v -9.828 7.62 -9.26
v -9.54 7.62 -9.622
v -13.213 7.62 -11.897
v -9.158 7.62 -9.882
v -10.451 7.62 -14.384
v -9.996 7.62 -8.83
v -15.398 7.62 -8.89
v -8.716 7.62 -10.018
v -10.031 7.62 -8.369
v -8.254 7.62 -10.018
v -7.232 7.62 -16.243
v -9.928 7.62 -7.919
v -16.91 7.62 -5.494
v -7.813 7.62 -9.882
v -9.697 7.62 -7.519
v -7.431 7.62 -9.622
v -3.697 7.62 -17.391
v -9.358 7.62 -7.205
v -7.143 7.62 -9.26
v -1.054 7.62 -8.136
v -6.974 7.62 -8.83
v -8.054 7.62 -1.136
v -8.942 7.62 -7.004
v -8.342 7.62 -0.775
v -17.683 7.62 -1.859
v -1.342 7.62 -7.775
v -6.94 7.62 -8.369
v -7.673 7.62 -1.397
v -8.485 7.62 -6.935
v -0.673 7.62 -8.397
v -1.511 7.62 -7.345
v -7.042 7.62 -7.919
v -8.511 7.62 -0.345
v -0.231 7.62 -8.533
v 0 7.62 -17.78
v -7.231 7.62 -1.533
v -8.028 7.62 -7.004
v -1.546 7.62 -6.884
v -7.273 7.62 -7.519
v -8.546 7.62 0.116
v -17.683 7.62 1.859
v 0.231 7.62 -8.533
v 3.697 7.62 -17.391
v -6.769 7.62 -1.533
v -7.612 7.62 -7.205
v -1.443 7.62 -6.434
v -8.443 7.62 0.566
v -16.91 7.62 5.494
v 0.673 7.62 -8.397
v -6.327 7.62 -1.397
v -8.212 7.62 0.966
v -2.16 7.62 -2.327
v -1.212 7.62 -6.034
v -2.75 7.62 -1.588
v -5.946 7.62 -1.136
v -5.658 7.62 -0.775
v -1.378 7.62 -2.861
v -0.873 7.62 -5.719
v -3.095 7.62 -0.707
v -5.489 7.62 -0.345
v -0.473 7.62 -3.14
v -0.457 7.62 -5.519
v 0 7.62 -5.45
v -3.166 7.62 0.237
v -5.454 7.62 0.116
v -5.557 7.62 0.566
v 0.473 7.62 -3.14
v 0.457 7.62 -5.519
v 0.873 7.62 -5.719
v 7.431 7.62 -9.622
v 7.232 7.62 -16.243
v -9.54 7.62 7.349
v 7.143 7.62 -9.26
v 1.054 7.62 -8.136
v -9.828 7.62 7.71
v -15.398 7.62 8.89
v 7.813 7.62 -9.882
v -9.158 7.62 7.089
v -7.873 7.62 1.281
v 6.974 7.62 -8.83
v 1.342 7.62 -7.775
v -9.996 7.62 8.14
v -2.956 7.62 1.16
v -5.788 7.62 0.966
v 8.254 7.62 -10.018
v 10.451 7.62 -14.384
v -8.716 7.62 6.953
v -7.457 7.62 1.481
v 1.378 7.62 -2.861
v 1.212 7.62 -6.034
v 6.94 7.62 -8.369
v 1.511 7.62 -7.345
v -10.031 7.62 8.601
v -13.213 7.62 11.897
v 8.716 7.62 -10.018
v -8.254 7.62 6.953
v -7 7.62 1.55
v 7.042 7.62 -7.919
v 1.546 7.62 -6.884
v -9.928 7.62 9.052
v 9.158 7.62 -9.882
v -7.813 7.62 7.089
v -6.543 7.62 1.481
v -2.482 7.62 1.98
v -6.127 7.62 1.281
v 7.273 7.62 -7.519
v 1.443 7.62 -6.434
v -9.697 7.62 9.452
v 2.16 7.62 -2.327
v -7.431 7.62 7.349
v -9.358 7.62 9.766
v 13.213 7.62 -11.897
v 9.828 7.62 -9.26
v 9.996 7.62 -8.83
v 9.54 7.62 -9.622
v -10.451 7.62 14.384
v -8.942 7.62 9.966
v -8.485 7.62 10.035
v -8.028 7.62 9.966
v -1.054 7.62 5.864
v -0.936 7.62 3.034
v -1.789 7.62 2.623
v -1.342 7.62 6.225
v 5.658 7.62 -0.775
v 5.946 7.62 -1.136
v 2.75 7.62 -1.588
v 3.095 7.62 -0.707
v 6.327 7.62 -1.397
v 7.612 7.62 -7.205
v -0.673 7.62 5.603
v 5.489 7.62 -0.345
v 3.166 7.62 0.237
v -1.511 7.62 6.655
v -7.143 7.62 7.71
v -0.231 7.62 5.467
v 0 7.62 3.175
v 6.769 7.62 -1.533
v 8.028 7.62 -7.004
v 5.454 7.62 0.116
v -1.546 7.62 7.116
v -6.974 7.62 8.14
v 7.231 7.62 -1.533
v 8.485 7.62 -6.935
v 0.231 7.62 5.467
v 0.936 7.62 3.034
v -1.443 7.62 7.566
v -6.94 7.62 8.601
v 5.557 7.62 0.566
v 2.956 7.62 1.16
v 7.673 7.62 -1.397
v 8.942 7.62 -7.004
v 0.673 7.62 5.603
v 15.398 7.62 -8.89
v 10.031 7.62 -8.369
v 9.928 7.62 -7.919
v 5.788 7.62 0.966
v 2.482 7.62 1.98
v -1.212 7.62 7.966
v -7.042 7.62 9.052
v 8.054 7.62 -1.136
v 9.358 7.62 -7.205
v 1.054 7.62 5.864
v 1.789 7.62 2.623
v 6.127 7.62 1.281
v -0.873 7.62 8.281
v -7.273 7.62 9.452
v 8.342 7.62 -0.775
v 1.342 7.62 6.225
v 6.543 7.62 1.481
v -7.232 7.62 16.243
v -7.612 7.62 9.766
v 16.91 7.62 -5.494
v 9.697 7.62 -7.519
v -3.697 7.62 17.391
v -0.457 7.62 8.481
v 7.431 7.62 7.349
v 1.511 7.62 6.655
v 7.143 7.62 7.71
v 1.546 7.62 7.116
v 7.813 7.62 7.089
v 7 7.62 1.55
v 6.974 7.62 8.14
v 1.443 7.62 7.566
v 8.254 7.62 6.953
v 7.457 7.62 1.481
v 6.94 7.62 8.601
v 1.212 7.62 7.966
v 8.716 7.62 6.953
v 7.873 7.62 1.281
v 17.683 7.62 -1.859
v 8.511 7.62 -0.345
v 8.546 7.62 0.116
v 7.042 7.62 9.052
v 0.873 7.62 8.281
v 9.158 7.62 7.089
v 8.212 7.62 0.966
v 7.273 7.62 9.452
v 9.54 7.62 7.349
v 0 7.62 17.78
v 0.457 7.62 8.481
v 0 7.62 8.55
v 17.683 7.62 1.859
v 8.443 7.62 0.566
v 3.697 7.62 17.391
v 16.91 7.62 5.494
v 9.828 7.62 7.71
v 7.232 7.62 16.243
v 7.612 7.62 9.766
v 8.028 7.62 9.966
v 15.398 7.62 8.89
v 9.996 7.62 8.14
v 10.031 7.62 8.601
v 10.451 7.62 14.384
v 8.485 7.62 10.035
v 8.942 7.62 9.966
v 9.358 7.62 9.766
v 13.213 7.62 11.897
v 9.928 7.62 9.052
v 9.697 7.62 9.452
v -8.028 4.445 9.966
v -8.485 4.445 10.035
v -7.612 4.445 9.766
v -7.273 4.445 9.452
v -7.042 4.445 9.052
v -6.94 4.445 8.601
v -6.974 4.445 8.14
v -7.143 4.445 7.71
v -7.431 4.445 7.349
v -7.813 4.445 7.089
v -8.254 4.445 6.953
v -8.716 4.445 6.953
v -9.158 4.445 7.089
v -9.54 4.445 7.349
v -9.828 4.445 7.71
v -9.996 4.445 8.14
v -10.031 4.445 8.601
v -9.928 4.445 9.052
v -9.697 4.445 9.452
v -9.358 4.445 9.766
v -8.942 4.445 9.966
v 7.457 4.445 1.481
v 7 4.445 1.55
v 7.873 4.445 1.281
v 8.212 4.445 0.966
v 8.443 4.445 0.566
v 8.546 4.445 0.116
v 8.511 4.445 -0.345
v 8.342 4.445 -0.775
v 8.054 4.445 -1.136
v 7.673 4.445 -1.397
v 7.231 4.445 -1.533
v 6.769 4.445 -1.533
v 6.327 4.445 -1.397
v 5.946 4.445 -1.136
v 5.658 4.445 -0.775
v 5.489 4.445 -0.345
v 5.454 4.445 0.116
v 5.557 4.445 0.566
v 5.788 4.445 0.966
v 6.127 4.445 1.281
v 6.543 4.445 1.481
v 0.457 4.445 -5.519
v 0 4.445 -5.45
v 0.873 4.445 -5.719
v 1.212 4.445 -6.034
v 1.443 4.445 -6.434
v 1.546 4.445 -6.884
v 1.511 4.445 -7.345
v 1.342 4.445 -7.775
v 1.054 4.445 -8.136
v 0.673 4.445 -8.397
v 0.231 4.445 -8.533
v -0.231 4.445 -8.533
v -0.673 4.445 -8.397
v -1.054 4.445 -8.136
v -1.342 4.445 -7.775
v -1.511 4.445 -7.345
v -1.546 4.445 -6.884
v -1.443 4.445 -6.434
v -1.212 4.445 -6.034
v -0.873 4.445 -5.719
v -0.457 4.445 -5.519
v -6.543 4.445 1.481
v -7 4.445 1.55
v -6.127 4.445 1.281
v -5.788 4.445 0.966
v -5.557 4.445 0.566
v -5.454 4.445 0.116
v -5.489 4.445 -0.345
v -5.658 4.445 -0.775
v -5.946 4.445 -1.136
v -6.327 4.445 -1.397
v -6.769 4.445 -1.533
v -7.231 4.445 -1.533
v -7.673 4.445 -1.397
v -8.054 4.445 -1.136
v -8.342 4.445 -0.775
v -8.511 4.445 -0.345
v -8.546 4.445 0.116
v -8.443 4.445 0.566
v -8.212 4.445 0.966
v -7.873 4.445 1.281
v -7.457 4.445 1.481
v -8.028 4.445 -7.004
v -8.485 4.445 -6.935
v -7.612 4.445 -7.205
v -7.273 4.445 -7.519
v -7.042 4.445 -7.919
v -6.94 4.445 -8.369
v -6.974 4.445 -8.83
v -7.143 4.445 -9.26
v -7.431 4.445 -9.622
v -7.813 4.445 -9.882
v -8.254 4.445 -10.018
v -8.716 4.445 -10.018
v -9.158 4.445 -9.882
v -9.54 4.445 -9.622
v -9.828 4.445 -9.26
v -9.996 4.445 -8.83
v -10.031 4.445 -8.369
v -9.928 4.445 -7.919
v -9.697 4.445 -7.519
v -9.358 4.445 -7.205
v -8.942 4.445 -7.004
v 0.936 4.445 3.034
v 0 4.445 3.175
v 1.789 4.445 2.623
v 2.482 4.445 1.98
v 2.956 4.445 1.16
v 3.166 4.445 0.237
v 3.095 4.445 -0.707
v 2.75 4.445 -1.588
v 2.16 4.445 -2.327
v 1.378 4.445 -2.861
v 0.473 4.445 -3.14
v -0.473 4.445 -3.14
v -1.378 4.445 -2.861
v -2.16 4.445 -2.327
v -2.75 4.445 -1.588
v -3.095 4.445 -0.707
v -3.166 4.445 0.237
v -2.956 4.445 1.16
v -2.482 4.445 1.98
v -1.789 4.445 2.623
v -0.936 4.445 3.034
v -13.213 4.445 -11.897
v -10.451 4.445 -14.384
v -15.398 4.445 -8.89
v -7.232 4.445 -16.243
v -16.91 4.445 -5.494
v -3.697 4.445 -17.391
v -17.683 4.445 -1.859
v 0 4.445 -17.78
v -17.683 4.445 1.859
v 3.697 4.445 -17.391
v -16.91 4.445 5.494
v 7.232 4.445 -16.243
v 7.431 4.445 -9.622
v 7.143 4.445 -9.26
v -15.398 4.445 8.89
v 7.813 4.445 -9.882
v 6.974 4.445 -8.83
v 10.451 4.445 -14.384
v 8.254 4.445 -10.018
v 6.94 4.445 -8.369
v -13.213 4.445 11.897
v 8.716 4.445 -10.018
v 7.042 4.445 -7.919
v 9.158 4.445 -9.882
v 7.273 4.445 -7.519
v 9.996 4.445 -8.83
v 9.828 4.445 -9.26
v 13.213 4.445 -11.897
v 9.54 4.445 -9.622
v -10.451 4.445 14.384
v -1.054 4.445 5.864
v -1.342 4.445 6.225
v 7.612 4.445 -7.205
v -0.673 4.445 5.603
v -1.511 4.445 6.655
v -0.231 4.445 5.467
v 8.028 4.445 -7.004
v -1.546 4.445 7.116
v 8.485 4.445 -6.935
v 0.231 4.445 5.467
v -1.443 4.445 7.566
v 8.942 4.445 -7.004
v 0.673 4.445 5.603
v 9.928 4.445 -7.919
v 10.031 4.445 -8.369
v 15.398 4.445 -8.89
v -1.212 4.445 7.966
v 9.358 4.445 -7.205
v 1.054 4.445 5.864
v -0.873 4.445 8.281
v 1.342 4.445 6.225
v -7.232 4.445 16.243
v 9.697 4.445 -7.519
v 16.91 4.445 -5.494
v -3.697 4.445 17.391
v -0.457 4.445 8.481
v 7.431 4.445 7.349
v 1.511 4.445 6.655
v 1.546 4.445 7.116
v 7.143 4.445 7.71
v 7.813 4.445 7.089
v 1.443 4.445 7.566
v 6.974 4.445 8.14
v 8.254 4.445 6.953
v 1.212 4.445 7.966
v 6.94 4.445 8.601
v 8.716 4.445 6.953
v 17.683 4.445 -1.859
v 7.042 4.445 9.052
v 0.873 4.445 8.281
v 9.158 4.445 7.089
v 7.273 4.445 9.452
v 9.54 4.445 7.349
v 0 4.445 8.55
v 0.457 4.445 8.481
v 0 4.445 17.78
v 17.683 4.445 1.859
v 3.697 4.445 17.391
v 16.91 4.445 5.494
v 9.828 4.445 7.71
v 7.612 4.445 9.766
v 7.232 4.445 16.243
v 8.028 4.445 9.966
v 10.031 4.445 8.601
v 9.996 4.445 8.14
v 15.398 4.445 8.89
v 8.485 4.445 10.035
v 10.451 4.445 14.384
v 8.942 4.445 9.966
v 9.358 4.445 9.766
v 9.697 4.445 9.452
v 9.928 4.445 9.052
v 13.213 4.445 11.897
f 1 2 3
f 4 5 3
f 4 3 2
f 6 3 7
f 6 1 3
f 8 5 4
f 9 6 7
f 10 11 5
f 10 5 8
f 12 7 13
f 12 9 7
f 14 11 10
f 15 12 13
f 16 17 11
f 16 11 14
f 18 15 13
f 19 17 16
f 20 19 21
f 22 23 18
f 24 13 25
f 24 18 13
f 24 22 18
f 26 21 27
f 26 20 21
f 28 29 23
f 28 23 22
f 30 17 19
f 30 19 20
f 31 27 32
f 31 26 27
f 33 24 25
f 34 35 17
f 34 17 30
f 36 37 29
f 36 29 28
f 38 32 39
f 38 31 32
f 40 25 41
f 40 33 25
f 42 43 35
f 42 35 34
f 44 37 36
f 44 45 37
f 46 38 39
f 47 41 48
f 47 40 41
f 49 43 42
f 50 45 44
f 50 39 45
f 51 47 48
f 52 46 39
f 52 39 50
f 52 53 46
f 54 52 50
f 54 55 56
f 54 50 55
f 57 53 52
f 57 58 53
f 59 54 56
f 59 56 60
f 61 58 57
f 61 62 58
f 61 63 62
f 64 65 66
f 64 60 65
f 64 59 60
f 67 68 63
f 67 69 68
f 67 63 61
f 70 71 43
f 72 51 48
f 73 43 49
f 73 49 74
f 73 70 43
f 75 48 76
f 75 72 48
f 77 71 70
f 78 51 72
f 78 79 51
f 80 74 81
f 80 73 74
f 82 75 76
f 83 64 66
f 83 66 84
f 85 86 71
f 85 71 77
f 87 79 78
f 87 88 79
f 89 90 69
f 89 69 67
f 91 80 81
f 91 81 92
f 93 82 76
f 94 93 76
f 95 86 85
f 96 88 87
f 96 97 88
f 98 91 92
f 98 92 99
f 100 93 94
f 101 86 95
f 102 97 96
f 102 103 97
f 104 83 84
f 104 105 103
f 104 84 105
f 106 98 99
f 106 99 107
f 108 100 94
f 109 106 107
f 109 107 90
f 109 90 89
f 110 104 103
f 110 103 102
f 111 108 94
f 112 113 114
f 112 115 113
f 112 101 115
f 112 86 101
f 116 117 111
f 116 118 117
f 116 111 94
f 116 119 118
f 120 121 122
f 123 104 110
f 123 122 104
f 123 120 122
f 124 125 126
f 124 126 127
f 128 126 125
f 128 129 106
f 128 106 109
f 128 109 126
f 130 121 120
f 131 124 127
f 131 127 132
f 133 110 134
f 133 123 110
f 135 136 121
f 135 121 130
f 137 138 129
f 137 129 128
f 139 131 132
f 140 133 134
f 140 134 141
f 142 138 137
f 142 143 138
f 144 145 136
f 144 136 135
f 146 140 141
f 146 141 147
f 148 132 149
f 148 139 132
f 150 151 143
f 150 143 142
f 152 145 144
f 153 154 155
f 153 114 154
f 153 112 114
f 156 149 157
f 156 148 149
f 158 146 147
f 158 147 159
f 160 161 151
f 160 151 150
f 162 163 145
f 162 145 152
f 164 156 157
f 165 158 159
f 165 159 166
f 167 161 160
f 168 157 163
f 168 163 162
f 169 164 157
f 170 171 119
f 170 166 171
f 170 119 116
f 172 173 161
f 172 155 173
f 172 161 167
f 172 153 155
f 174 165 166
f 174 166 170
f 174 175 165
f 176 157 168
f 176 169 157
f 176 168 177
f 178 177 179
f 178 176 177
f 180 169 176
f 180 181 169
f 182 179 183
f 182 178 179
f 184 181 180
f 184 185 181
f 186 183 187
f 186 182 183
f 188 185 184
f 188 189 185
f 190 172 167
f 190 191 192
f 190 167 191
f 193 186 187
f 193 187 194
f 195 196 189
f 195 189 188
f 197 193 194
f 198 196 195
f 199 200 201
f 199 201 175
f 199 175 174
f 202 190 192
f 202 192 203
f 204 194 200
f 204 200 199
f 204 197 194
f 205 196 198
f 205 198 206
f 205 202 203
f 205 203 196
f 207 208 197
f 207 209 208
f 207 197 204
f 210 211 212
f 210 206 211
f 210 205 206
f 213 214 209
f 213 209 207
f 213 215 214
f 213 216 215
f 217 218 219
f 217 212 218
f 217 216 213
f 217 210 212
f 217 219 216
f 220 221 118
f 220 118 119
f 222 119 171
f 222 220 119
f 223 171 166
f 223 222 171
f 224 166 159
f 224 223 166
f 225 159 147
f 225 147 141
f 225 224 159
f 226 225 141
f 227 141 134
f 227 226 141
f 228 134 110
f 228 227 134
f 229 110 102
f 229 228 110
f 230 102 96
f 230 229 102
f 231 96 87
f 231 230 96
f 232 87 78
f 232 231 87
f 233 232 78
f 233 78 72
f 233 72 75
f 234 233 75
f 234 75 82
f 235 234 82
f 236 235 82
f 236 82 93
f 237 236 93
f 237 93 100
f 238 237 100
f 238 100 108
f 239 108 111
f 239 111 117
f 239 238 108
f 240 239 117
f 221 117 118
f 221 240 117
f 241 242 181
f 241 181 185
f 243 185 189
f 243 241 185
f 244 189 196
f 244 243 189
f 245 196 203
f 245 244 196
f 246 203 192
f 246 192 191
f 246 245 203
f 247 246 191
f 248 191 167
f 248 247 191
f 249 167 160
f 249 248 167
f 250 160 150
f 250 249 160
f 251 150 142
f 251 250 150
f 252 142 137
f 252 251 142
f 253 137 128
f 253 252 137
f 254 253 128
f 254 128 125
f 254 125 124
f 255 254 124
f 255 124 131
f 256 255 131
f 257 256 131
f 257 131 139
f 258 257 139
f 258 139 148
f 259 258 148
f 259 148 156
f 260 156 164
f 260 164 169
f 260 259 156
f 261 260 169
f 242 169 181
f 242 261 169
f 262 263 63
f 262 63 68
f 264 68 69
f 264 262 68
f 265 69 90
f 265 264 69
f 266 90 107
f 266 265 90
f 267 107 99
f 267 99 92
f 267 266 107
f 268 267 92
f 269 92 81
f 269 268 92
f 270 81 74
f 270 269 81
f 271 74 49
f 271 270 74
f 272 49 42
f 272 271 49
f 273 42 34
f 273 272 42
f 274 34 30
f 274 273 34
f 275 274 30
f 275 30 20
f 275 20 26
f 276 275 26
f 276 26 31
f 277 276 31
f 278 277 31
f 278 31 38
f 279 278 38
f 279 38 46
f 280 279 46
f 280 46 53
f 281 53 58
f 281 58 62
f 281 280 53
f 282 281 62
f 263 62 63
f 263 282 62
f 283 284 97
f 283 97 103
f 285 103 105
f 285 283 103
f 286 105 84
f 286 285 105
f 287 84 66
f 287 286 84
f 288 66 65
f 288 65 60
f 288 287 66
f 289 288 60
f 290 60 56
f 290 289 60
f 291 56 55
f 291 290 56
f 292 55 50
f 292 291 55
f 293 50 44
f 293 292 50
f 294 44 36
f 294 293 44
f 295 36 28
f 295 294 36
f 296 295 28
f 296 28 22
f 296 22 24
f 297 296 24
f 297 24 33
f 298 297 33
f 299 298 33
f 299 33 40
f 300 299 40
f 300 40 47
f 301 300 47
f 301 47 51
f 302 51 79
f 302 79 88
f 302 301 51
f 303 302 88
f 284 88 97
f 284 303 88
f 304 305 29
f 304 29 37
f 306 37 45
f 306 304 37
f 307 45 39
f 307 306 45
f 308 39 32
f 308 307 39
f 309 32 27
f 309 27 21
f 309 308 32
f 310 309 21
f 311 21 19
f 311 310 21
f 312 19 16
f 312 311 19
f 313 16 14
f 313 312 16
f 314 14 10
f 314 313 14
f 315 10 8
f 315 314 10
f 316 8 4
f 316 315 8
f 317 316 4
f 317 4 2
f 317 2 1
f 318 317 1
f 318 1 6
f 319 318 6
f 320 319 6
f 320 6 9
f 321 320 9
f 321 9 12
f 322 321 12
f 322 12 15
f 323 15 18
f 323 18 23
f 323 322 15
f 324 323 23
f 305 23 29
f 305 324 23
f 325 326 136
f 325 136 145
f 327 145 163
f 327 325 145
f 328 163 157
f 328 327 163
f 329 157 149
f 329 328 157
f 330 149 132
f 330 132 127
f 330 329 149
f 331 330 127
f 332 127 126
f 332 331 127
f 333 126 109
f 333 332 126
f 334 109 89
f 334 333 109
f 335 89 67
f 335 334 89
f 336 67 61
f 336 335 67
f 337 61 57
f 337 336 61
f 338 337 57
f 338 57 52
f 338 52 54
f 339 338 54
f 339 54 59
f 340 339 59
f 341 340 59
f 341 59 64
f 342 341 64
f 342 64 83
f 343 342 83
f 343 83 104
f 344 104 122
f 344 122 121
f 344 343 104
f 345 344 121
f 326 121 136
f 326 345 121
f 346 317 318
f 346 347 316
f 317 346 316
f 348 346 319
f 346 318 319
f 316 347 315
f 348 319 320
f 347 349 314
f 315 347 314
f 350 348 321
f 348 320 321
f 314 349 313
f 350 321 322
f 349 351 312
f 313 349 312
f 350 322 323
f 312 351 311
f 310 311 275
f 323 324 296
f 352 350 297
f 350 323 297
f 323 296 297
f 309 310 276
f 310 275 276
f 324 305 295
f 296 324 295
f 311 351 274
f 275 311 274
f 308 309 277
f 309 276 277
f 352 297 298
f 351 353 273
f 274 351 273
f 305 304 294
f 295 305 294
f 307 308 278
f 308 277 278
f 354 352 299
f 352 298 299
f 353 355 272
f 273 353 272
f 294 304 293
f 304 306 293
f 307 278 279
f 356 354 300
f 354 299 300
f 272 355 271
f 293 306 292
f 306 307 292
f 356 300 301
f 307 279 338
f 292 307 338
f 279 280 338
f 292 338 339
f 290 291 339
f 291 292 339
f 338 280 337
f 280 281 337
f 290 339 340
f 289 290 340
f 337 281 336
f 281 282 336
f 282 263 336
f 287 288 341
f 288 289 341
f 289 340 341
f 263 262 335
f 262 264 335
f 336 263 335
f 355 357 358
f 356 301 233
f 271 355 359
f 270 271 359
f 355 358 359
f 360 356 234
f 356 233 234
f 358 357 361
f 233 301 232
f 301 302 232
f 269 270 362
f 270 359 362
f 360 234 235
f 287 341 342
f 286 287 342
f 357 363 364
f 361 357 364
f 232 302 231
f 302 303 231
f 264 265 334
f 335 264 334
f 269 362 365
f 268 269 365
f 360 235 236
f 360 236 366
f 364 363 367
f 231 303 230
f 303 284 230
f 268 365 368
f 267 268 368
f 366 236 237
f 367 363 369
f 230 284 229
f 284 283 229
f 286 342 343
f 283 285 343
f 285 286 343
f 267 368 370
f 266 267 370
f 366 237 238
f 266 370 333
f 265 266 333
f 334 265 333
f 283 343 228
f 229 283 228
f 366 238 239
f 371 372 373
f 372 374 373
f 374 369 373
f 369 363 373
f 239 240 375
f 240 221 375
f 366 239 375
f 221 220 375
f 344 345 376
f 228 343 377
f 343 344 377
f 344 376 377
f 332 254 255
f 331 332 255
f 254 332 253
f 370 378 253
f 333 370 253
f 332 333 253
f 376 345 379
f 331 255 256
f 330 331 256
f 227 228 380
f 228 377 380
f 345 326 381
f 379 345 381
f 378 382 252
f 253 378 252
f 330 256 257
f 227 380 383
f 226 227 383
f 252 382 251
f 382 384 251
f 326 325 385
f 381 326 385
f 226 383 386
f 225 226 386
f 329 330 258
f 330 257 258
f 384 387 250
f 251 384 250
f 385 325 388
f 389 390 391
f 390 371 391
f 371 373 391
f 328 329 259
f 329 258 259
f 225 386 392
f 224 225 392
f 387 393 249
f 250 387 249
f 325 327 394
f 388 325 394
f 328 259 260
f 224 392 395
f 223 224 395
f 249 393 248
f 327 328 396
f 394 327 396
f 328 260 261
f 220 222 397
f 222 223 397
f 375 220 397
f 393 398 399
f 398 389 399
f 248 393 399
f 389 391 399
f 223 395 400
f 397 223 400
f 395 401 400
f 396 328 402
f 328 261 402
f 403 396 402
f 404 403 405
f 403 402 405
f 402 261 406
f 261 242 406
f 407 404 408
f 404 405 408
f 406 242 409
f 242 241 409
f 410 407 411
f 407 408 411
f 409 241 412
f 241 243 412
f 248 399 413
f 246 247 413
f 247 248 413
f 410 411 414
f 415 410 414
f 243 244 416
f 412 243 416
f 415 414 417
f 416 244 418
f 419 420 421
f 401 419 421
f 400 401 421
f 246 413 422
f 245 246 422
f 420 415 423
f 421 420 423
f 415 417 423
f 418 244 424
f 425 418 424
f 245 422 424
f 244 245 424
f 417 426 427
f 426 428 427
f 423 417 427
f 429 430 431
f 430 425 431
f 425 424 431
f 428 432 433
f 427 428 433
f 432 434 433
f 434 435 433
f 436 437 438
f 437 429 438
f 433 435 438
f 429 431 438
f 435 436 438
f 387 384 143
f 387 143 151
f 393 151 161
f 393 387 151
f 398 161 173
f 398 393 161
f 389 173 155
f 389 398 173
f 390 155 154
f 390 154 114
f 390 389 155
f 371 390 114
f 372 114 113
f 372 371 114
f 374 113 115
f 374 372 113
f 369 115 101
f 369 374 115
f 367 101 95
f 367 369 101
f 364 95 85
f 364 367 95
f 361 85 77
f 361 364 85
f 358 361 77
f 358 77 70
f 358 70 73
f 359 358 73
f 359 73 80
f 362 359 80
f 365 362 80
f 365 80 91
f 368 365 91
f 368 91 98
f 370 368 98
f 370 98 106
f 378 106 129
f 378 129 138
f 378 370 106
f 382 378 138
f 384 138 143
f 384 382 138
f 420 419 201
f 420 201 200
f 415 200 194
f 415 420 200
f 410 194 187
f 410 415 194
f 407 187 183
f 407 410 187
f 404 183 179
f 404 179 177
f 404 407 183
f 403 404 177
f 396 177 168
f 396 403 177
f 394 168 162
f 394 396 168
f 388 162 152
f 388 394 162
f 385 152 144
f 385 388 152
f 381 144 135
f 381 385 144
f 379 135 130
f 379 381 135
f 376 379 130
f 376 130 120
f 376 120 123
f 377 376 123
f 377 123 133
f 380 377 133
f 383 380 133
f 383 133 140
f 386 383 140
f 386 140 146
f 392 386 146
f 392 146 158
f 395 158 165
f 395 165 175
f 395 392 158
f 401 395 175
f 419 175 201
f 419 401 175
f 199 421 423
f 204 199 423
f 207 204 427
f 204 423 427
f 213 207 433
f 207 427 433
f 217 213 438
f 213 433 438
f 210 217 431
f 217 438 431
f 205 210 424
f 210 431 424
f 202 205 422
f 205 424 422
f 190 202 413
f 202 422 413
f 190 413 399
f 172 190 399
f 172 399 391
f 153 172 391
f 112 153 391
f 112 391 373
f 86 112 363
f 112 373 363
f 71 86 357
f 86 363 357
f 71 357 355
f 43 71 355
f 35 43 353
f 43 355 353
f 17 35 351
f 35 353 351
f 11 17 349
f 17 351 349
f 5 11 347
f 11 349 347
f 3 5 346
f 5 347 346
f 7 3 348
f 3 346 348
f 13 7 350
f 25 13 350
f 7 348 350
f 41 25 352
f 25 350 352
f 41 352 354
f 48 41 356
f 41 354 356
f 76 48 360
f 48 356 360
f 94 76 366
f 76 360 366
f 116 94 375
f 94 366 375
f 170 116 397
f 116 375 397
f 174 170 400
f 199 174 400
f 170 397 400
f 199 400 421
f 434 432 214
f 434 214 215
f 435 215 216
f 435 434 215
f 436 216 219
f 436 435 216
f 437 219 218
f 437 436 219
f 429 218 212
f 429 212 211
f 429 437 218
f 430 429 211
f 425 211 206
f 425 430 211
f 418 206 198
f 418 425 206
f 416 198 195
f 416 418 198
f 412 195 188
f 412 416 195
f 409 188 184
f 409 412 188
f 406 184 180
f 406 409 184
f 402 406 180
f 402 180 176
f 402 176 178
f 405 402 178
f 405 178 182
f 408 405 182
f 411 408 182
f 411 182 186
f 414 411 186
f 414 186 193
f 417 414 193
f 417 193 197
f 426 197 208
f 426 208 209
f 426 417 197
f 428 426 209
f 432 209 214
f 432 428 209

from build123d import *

# Parameters (mm, degrees)
SKETCH2_R           = 1.27
CUT_EXTRUDE1_DEPTH  = 15.69747247
SKETCH3_R           = 17.78
SKETCH3_R_2         = 3.175
SKETCH3_R_3         = 1.55
BOSS_EXTRUDE1_DEPTH = 3.175


with BuildPart() as part:
    # Sketch1 → Revolve1 (revolve)
    with BuildSketch(Plane.XY, mode=Mode.PRIVATE) as revolve1_sk:
        Polygon((4.572, 0), (4.572, 1.905), (9.906, 1.905), (9.906, 4.445), (1.397, 4.445), (1.397, 2.54), (3.175, 2.54), (3.175, 0), align=None)
    revolve(revolve1_sk.sketch.rotate(Axis((0, 0, 0), (0, 1, 0)), 90), axis=Axis((0, 0, 0), (0, 1, 0)))

    # Sketch2 → Cut-Extrude1 (cut, through all)
    with BuildSketch(Plane(origin=(0, 4.445, 0), x_dir=(1, 0, 0), z_dir=(0, 1, 0))):
        with Locations(Location((0, 7, 0), (0, 0, 270))):
            Circle(SKETCH2_R)
        with Locations(Location((7, 0, 0), (0, 0, 270))):
            Circle(SKETCH2_R)
        with Locations(Location((0, -7, 0), (0, 0, 270))):
            Circle(SKETCH2_R)
        with Locations(Location((-7, 0, 0), (0, 0, 270))):
            Circle(SKETCH2_R)
    extrude(amount=-CUT_EXTRUDE1_DEPTH, mode=Mode.SUBTRACT)


with BuildPart() as body_2:
    # Sketch3 → Boss-Extrude1 (new body)
    with BuildSketch(Plane(origin=(0, 4.445, 0), x_dir=(1, 0, 0), z_dir=(0, 1, 0))):
        with Locations(Location((0, 0, 0), (0, 0, 270))):
            Circle(SKETCH3_R)
        with Locations(Location((0, 0, 0), (0, 0, 270))):
            Circle(SKETCH3_R_2, mode=Mode.SUBTRACT)
        with Locations(Location((-8.485281374, 8.485281374, 0), (0, 0, 270))):
            Circle(SKETCH3_R_3, mode=Mode.SUBTRACT)
        with Locations(Location((0, 7, 0), (0, 0, 270))):
            Circle(SKETCH3_R_3, mode=Mode.SUBTRACT)
        with Locations(Location((7, 0, 0), (0, 0, 270))):
            Circle(SKETCH3_R_3, mode=Mode.SUBTRACT)
        with Locations(Location((0, -7, 0), (0, 0, 270))):
            Circle(SKETCH3_R_3, mode=Mode.SUBTRACT)
        with Locations(Location((-7, 0, 0), (0, 0, 270))):
            Circle(SKETCH3_R_3, mode=Mode.SUBTRACT)
        with Locations(Location((8.485281374, 8.485281374, 0), (0, 0, 270))):
            Circle(SKETCH3_R_3, mode=Mode.SUBTRACT)
        with Locations(Location((8.485281374, -8.485281374, 0), (0, 0, 270))):
            Circle(SKETCH3_R_3, mode=Mode.SUBTRACT)
        with Locations(Location((-8.485281374, -8.485281374, 0), (0, 0, 270))):
            Circle(SKETCH3_R_3, mode=Mode.SUBTRACT)
    extrude(amount=BOSS_EXTRUDE1_DEPTH)


solid = body_2.part
